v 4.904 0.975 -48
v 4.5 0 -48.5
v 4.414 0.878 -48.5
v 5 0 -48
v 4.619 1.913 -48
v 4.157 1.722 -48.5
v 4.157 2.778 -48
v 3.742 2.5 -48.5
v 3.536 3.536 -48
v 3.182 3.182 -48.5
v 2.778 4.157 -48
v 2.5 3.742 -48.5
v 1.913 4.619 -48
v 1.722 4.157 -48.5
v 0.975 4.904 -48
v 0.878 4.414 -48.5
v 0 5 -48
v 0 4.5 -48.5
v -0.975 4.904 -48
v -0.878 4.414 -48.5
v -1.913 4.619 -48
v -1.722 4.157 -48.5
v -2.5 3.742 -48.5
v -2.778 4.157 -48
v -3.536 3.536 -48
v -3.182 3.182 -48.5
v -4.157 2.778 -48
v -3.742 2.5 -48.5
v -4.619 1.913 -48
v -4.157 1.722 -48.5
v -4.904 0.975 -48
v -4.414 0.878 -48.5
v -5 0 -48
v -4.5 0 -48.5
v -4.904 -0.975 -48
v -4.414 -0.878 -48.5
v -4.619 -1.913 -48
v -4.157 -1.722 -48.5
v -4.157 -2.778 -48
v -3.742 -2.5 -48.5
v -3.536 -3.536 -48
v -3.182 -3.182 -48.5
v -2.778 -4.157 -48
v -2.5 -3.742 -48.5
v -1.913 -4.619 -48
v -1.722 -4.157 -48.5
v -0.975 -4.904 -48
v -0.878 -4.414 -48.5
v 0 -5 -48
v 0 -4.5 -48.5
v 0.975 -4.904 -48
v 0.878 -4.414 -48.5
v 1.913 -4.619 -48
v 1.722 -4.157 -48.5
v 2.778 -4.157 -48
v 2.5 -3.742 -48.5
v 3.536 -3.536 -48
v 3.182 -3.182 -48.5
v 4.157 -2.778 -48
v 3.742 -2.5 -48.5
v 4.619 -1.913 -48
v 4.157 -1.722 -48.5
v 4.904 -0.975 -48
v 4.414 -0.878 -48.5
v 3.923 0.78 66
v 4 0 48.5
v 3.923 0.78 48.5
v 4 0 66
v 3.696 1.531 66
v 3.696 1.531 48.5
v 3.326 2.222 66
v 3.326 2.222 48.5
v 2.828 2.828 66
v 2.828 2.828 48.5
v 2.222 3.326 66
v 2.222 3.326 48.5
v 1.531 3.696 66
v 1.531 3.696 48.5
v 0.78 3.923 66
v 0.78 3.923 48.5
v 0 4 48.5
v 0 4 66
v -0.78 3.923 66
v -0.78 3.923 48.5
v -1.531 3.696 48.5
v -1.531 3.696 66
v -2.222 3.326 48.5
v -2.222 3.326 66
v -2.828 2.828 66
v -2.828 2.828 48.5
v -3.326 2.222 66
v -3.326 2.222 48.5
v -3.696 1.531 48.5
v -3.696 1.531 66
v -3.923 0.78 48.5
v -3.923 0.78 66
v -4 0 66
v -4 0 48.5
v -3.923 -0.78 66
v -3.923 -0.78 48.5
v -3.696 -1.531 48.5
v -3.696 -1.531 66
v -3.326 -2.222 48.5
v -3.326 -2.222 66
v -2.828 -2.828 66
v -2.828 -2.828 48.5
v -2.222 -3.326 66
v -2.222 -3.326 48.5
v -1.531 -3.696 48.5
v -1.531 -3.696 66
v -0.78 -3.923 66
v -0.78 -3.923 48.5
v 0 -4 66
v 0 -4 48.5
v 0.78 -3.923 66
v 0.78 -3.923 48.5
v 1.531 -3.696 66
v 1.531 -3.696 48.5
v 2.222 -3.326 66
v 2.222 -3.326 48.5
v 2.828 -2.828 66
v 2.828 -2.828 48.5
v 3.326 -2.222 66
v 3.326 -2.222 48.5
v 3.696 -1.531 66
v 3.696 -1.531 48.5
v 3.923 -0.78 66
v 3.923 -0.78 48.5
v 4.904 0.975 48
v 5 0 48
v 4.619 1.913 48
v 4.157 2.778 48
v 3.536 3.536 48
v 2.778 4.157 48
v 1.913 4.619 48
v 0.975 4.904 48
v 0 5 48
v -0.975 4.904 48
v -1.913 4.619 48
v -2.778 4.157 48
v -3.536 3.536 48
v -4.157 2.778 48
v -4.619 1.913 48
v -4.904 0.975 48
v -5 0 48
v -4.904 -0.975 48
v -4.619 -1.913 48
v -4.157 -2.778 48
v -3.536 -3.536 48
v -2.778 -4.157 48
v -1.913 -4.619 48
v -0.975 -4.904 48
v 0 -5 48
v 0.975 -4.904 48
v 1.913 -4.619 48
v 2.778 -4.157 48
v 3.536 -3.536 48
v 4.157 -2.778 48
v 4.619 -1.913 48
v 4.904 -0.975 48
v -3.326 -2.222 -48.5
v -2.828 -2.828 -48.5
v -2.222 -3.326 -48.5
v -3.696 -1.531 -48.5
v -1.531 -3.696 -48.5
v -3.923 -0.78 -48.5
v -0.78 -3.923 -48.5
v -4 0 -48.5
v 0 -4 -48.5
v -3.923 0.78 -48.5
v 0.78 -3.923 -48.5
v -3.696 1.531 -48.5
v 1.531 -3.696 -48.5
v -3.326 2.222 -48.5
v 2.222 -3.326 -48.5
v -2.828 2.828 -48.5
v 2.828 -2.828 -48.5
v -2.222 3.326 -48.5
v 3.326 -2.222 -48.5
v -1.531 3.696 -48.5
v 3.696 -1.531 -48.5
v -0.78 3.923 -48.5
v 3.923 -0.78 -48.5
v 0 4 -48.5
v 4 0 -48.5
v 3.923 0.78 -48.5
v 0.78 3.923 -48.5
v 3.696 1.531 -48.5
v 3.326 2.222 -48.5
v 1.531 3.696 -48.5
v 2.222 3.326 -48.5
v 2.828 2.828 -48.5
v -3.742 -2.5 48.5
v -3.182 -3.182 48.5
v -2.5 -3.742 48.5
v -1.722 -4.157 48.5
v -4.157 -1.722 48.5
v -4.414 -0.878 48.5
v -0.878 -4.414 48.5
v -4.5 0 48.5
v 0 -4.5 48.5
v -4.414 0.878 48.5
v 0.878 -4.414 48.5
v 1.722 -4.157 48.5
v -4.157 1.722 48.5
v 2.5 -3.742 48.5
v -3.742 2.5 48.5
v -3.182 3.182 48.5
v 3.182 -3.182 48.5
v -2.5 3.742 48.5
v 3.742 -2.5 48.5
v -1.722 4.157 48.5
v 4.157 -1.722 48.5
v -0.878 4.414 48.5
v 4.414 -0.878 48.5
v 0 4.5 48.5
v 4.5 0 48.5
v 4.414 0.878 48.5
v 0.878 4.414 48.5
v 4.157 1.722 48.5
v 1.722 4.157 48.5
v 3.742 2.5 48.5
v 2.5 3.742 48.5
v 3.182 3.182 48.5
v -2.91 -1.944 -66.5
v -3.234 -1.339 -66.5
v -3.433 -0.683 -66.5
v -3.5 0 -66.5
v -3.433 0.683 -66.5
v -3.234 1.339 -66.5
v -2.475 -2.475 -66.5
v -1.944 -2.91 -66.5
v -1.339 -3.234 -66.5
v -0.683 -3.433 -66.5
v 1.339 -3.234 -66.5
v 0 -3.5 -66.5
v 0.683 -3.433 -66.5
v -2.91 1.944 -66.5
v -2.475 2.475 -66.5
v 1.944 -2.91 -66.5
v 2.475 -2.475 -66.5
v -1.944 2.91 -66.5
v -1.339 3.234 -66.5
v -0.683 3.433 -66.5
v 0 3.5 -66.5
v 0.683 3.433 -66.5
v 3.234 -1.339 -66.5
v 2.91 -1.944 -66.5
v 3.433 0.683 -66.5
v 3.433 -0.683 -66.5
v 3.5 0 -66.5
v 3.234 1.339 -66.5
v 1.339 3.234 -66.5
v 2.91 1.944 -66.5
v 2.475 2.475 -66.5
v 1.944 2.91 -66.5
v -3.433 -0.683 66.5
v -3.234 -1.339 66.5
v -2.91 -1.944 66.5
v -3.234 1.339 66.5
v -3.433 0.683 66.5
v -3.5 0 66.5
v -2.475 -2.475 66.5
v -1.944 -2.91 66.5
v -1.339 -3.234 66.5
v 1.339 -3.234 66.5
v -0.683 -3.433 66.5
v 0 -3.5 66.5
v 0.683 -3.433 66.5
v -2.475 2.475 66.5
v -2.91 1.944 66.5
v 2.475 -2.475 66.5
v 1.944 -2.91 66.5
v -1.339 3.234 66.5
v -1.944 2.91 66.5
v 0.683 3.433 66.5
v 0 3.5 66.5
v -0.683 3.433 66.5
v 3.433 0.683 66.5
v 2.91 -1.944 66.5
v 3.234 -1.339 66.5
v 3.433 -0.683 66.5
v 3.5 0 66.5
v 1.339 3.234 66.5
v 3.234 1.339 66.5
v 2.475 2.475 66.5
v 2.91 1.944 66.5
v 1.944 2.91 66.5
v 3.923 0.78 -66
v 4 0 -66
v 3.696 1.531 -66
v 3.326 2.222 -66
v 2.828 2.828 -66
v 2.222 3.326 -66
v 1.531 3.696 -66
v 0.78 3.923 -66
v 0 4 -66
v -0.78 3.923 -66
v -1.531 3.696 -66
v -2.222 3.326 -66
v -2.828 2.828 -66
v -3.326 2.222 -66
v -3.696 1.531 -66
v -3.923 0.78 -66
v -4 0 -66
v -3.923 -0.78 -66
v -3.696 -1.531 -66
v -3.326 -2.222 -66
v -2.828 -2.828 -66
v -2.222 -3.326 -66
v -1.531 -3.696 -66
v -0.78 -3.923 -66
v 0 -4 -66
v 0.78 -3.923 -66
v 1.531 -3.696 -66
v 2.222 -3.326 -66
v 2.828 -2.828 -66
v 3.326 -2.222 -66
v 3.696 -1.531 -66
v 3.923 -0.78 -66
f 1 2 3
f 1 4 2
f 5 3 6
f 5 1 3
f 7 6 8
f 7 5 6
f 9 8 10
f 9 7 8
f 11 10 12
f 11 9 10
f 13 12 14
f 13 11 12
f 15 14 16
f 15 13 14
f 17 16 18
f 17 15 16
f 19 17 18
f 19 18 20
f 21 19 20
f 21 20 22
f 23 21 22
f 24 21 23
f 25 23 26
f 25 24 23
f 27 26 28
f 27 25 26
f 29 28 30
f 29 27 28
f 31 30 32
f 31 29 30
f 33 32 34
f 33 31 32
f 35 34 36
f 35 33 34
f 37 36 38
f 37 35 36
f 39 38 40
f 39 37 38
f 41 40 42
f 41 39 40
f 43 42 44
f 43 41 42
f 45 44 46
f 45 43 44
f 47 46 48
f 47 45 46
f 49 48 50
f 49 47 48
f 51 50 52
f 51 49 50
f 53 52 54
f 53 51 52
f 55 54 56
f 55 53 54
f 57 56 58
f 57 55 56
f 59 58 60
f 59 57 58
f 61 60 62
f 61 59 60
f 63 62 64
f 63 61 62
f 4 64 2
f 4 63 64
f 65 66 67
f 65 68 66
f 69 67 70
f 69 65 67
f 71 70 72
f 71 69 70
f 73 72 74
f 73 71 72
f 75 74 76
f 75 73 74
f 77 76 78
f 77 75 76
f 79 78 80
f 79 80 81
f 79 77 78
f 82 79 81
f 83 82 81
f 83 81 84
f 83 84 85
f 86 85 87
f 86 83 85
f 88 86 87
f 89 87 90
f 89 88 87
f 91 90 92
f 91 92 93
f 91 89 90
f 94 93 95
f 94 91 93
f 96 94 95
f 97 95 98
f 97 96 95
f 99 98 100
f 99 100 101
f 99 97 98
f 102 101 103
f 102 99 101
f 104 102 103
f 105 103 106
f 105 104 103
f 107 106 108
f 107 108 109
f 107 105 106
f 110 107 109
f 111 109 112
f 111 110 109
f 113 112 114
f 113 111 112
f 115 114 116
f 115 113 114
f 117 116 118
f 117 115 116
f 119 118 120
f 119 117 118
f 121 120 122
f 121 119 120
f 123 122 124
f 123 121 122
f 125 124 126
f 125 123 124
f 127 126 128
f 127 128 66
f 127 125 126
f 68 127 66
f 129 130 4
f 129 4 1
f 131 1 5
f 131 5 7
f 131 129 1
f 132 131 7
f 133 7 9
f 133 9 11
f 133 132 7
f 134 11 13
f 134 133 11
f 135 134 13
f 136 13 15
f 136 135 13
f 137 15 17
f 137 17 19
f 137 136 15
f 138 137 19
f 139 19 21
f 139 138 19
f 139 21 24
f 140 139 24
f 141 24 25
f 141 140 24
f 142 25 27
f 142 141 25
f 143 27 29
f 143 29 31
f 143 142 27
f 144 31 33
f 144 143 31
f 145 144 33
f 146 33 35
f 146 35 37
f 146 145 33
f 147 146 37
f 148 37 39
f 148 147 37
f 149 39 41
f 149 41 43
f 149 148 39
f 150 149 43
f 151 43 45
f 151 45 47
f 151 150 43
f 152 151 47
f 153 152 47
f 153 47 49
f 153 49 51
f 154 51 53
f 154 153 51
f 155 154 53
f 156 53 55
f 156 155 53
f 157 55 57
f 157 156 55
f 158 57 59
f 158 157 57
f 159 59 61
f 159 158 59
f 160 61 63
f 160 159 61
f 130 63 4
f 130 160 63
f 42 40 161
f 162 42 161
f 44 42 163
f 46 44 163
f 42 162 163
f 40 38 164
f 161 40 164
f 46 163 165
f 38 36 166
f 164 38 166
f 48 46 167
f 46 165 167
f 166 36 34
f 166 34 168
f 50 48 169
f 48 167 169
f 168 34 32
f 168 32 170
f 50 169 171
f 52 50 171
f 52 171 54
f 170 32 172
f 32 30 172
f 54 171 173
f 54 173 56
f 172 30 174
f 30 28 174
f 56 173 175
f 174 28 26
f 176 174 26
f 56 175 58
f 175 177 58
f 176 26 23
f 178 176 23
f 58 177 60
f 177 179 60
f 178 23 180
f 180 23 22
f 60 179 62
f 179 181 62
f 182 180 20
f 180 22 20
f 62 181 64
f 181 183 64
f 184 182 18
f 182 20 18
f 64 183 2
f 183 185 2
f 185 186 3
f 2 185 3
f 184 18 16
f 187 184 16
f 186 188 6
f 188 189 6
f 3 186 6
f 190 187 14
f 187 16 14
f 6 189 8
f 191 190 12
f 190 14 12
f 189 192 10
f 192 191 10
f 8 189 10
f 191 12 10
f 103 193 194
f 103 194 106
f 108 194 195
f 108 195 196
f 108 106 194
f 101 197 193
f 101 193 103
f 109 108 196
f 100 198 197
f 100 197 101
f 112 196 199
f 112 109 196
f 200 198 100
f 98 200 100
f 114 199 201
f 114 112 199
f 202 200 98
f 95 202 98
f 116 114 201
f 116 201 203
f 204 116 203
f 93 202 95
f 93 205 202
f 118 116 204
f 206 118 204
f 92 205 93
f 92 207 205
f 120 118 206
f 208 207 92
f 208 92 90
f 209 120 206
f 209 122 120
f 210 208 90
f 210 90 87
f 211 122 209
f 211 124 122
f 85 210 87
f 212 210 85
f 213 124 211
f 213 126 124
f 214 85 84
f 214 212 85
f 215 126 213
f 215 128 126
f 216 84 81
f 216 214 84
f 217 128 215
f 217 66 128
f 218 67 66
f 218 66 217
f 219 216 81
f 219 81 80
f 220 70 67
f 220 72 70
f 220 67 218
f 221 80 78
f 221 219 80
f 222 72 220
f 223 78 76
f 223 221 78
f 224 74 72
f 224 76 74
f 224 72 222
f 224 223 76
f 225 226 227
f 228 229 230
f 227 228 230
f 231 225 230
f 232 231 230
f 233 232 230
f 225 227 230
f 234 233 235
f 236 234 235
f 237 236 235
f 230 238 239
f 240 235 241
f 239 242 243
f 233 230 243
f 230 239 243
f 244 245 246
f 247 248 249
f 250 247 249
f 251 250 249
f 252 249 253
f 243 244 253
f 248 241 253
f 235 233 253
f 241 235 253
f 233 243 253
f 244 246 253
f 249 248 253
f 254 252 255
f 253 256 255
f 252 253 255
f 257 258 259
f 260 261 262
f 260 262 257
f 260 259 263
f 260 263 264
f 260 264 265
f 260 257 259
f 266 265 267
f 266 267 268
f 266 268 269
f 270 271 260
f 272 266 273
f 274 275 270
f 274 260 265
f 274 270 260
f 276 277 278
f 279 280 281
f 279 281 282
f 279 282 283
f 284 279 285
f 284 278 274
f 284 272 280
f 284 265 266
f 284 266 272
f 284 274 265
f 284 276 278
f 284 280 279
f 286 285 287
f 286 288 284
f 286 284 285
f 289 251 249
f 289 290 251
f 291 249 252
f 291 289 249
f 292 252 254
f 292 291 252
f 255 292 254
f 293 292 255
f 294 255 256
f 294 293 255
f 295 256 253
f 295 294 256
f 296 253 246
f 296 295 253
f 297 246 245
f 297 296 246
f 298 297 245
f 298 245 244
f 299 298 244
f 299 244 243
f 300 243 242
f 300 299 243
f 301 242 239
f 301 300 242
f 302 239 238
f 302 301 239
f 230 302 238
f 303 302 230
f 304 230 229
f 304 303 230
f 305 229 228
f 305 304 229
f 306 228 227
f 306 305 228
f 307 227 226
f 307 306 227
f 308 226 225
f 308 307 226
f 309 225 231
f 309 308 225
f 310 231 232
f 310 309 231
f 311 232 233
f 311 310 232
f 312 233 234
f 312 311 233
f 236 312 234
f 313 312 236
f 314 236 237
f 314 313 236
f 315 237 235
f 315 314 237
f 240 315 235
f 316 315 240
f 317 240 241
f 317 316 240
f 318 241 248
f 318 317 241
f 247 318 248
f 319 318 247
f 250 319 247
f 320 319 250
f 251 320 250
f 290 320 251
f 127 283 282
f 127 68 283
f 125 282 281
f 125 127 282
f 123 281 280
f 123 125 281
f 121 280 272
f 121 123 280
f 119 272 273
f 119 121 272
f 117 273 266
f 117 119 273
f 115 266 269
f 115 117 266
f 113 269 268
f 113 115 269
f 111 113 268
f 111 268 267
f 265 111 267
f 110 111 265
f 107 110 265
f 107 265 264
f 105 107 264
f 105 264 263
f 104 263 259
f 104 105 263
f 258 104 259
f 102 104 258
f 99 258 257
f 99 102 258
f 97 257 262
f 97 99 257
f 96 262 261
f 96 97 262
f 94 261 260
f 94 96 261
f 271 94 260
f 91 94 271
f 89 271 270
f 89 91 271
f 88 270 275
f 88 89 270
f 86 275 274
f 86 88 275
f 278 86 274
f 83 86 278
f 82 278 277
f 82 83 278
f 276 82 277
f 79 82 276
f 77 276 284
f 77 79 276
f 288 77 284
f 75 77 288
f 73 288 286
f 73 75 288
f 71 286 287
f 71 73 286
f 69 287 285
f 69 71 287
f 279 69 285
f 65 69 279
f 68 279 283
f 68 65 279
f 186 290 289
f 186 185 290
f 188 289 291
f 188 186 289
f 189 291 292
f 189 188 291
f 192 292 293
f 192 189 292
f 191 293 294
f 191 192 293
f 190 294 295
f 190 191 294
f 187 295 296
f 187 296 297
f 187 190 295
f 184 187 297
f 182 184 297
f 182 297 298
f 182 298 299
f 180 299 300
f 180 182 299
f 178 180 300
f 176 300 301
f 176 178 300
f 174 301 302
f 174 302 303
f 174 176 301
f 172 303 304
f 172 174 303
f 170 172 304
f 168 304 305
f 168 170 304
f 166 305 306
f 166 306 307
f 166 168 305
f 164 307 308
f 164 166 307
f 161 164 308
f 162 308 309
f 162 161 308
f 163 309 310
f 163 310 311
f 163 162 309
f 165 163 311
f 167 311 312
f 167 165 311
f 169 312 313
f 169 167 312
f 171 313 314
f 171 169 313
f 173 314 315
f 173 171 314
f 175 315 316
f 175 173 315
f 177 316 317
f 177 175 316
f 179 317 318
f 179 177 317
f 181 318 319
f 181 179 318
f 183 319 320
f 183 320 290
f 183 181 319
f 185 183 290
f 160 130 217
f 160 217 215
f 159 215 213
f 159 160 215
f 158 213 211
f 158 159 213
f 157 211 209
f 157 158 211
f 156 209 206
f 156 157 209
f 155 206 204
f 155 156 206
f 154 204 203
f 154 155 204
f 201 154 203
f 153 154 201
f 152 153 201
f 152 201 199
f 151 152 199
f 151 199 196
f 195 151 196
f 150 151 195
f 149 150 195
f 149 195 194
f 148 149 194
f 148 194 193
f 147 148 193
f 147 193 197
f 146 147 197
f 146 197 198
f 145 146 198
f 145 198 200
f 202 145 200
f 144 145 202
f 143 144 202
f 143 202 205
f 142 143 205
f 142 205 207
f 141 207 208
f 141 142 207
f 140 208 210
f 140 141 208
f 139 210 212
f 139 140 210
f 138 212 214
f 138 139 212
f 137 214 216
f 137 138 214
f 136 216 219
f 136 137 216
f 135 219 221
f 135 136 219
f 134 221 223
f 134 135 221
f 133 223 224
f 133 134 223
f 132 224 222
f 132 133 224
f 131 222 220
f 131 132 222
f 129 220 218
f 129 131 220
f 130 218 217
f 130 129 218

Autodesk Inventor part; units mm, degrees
ref_plane "YZ Plane" through (0, 0, 0) normal (1, 0, 0) x (0, 1, 0)
ref_plane "XZ Plane" through (0, 0, 0) normal (0, 1, 0) x (-1, 0, 0)
ref_plane "XY Plane" through (0, 0, 0) normal (0, 0, 1) x (1, 0, 0)
sketch "Sketch1" plane through (0, 0, 0) normal (0, 1, 0) x (-1, 0, 0)
  line L0 (1, 0) -> (-6, 0) projected
  line L1 (0, -93.1) -> (0, 93.1) projected
  line L2 (0, -66.5) -> (-4, -66.5)
  line L3 (-4, -66.5) -> (-4, -48.5)
  line L4 (-4, -48.5) -> (-5, -48.5)
  line L5 (-5, -48.5) -> (-5, 48.5)
  line L6 (-5, 48.5) -> (-4, 48.5)
  line L7 (-4, 48.5) -> (-4, 66.5)
  line L8 (-4, 66.5) -> (0, 66.5)
  dimension "d1" = 18
  dimension "d2" = 8
  dimension "d3" = 10
  dimension "d5" = 8
  dimension "d8" = 18
  dimension "d9" = 97
revolve "Revolution1" add sketch "Sketch1" angle 360 about axis through (0, 0, -10) along (0, 0, 1)
chamfer "Chamfer1" distance 0.5 angle 45 4 edges at (-4, 0, -66.5) (-4, 0, 66.5) (-5, 0, 48.5) (-5, 0, -48.5)
thread "Thread1" size "M8x1.25" class "6g" standard "ANSI Metric M Profile" full length
thread "Thread2" size "M8x1.25" class "6g" standard "ANSI Metric M Profile" full length
equation "\"d5\" = d2"
equation "\"d8\" = d1"
properties part number "Rear Wheel Axle"
